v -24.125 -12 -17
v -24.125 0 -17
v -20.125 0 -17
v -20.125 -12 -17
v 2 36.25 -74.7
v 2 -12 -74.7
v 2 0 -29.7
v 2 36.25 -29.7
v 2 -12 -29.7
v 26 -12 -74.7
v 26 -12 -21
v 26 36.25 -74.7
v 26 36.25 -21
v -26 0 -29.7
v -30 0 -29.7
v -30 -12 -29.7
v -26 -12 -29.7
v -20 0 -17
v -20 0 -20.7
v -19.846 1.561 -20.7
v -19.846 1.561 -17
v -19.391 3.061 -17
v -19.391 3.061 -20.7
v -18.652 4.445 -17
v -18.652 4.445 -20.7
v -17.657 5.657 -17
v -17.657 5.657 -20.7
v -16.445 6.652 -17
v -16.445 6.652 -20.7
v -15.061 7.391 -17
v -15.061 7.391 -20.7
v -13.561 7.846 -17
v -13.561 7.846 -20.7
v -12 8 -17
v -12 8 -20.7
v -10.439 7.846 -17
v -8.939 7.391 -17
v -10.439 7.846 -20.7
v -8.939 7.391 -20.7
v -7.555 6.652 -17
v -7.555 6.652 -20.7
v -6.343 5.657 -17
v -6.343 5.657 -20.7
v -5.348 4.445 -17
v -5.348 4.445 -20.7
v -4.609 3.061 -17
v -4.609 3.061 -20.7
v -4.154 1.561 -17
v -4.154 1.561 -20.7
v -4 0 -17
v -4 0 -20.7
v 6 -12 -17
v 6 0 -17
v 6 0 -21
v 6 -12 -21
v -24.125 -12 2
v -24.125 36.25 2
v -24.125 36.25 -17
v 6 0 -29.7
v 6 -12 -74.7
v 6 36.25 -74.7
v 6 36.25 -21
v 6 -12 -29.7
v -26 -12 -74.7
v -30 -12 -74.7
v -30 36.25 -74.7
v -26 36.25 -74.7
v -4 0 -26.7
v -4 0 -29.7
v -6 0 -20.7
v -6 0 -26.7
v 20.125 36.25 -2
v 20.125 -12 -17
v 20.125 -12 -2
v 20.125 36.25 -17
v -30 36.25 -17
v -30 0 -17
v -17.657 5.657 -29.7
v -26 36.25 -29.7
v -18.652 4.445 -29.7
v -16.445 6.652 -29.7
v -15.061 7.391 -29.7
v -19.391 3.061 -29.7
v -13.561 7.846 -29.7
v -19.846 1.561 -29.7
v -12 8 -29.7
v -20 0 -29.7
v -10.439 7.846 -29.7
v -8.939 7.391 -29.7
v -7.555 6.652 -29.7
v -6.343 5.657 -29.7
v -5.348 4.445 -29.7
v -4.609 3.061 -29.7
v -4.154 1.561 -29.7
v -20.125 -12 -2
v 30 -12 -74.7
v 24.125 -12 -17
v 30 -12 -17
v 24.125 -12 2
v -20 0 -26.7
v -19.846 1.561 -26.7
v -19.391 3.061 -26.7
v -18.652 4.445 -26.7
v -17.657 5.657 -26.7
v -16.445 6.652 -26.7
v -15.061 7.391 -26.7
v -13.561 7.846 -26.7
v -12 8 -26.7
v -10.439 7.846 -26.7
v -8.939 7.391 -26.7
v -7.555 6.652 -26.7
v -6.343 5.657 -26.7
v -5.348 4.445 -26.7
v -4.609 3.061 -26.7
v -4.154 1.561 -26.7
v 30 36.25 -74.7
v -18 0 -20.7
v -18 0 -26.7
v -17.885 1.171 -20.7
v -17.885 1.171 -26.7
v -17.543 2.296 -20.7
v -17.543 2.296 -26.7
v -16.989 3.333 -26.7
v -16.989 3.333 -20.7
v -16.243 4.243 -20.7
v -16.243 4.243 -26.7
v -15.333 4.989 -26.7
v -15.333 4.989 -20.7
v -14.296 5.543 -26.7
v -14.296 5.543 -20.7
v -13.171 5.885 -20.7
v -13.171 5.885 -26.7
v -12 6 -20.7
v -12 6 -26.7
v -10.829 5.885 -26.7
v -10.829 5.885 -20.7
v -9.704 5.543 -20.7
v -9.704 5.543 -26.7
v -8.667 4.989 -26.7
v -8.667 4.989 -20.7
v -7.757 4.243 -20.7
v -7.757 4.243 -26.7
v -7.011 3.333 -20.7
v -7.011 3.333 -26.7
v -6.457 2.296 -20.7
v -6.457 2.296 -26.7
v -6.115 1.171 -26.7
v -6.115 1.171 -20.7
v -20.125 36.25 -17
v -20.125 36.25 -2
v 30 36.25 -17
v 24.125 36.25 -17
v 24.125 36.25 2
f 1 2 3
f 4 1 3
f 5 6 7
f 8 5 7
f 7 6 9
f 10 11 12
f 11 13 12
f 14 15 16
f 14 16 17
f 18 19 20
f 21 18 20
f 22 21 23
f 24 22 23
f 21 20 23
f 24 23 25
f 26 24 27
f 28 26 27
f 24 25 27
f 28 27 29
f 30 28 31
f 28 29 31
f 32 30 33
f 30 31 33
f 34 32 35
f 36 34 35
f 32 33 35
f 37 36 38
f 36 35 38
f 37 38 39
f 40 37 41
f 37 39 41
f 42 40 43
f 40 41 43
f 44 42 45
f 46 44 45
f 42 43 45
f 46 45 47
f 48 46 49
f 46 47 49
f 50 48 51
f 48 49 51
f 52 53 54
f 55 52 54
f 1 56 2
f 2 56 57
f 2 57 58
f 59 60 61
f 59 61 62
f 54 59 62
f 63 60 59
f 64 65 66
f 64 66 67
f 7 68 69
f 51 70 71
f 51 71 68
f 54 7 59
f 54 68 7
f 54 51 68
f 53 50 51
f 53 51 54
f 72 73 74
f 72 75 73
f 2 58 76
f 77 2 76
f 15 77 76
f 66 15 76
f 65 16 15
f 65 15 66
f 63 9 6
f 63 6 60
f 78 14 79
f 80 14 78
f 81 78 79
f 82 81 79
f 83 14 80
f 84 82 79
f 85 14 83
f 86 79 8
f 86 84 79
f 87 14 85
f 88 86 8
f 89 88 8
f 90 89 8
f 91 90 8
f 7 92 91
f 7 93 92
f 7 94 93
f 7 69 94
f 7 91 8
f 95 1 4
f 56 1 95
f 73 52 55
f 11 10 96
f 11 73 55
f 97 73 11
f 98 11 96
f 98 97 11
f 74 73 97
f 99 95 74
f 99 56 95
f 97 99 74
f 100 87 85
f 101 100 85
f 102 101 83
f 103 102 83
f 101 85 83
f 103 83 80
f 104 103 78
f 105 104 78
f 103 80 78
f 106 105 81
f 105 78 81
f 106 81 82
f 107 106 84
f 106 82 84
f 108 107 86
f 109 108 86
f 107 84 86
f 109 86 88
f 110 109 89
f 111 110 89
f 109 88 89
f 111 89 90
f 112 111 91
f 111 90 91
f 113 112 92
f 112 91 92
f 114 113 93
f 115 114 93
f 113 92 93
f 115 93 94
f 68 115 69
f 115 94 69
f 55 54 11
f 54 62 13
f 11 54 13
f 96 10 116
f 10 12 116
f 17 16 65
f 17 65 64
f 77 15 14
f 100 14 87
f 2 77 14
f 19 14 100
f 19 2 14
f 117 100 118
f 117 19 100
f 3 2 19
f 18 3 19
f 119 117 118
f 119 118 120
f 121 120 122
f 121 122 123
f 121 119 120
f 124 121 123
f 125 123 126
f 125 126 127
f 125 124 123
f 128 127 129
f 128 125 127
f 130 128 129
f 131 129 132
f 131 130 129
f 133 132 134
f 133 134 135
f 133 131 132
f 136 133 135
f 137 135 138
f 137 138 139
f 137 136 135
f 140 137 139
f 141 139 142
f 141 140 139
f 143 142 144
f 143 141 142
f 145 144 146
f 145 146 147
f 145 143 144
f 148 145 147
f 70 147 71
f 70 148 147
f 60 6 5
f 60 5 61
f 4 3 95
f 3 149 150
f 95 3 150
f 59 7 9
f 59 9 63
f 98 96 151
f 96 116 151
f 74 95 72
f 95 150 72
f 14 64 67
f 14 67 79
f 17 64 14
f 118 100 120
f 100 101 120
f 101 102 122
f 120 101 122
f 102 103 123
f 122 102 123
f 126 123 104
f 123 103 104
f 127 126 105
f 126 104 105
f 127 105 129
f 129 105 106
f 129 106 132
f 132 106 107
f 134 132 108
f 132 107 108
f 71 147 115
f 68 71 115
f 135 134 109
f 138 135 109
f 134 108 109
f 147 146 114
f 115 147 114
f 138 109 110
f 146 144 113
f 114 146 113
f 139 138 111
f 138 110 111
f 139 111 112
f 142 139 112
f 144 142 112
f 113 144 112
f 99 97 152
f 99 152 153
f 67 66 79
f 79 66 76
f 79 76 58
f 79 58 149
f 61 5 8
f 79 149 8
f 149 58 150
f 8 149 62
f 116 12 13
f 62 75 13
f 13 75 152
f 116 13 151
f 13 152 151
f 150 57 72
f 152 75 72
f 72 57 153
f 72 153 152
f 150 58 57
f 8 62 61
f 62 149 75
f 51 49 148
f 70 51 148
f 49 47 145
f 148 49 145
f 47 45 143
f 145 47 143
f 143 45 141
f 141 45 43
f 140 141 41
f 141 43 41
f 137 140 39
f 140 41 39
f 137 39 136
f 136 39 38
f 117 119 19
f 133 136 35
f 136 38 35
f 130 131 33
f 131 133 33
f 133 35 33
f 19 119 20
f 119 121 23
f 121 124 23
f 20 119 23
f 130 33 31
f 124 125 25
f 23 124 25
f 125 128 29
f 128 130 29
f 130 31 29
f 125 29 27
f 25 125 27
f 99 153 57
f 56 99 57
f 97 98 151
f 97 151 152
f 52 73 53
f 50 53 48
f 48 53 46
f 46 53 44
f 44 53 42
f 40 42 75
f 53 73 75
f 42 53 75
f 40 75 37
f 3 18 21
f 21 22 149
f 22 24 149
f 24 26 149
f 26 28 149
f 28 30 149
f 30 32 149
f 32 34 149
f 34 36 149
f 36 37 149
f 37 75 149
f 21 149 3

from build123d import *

# Parameters (mm, degrees)
F1_W     = 4
F1_H     = 15
F1_W_2   = 6
F1_H_2   = 6
F1_H_3   = 45
F2_DEPTH = 36.25
F4_DEPTH = 12


# Not quite as in the source:
# - a feature names something its author has since deleted; it is built from what else it names


with BuildPart() as f2:
    # F1 (on Front) → F2 (new body)
    with BuildSketch(Plane.XZ):
        Polygon((24.125, -2), (24.125, 2), (-24.125, 2), (-24.125, -2), (-20.125, -2), (20.125, -2), align=None)
        with Locations((-22.125, -9.5)):
            Rectangle(F1_W, F1_H)
        with Locations((22.125, -9.5)):
            Rectangle(F1_W, F1_H)
        Polygon((24.125, -21), (24.125, -17), (20.125, -17), (6, -17), (6, -21), align=None)
        Polygon((6, -21), (6, -17), (-4, -17), (-4, -20.7), (-6, -20.7), (-6, -26.7), (-4, -26.7), (-4, -29.7), (-0.85, -29.7), (2, -29.7), (6, -29.7), align=None)
        Polygon((-20.125, -17), (-24.125, -17), (-30, -17), (-30, -29.7), (-26, -29.7), (-23.15, -29.7), (-20, -29.7), (-20, -26.7), (-18, -26.7), (-18, -20.7), (-20, -20.7), (-20, -17), align=None)
        Polygon((-4, -20.7), (-4, -17), (-12, -17), (-12, -20.7), (-6, -20.7), align=None)
        Polygon((-12, -17), (-20, -17), (-20, -20.7), (-18, -20.7), (-12, -20.7), align=None)
        with Locations((-15, -23.7)):
            Rectangle(F1_W_2, F1_H_2)
        with Locations((-9, -23.7)):
            Rectangle(F1_W_2, F1_H_2)
        Polygon((-12, -29.7), (-12, -26.7), (-18, -26.7), (-20, -26.7), (-20, -29.7), align=None)
        Polygon((-6, -26.7), (-12, -26.7), (-12, -29.7), (-4, -29.7), (-4, -26.7), align=None)
        Polygon((30, -17), (24.125, -17), (24.125, -21), (26, -21), (26, -74.7), (30, -74.7), align=None)
        with Locations((-28, -52.2)):
            Rectangle(F1_W, F1_H_3)
        with Locations((4, -52.2)):
            Rectangle(F1_W, F1_H_3)
    extrude(amount=-F2_DEPTH)

    # F1 (on Front) → F3 (revolve, cut)
    with BuildSketch(Plane.XZ):
        Polygon((-12, -17), (-20, -17), (-20, -20.7), (-18, -20.7), (-12, -20.7), align=None)
        with Locations((-15, -23.7)):
            Rectangle(F1_W_2, F1_H_2)
        Polygon((-12, -29.7), (-12, -26.7), (-18, -26.7), (-20, -26.7), (-20, -29.7), align=None)
    revolve(axis=Axis((-12, 0, -48.15), (0, 0, -1)), mode=Mode.SUBTRACT)

    # F1 (on Front) → F4 (join)
    with BuildSketch(Plane.XZ):
        Polygon((24.125, -2), (24.125, 2), (-24.125, 2), (-24.125, -2), (-20.125, -2), (20.125, -2), align=None)
        with Locations((22.125, -9.5)):
            Rectangle(F1_W, F1_H)
        with Locations((-22.125, -9.5)):
            Rectangle(F1_W, F1_H)
        Polygon((24.125, -21), (24.125, -17), (20.125, -17), (6, -17), (6, -21), align=None)
        Polygon((30, -17), (24.125, -17), (24.125, -21), (26, -21), (26, -74.7), (30, -74.7), align=None)
        with Locations((-28, -52.2)):
            Rectangle(F1_W, F1_H_3)
        with Locations((4, -52.2)):
            Rectangle(F1_W, F1_H_3)
    extrude(amount=F4_DEPTH)


solid = f2.part
